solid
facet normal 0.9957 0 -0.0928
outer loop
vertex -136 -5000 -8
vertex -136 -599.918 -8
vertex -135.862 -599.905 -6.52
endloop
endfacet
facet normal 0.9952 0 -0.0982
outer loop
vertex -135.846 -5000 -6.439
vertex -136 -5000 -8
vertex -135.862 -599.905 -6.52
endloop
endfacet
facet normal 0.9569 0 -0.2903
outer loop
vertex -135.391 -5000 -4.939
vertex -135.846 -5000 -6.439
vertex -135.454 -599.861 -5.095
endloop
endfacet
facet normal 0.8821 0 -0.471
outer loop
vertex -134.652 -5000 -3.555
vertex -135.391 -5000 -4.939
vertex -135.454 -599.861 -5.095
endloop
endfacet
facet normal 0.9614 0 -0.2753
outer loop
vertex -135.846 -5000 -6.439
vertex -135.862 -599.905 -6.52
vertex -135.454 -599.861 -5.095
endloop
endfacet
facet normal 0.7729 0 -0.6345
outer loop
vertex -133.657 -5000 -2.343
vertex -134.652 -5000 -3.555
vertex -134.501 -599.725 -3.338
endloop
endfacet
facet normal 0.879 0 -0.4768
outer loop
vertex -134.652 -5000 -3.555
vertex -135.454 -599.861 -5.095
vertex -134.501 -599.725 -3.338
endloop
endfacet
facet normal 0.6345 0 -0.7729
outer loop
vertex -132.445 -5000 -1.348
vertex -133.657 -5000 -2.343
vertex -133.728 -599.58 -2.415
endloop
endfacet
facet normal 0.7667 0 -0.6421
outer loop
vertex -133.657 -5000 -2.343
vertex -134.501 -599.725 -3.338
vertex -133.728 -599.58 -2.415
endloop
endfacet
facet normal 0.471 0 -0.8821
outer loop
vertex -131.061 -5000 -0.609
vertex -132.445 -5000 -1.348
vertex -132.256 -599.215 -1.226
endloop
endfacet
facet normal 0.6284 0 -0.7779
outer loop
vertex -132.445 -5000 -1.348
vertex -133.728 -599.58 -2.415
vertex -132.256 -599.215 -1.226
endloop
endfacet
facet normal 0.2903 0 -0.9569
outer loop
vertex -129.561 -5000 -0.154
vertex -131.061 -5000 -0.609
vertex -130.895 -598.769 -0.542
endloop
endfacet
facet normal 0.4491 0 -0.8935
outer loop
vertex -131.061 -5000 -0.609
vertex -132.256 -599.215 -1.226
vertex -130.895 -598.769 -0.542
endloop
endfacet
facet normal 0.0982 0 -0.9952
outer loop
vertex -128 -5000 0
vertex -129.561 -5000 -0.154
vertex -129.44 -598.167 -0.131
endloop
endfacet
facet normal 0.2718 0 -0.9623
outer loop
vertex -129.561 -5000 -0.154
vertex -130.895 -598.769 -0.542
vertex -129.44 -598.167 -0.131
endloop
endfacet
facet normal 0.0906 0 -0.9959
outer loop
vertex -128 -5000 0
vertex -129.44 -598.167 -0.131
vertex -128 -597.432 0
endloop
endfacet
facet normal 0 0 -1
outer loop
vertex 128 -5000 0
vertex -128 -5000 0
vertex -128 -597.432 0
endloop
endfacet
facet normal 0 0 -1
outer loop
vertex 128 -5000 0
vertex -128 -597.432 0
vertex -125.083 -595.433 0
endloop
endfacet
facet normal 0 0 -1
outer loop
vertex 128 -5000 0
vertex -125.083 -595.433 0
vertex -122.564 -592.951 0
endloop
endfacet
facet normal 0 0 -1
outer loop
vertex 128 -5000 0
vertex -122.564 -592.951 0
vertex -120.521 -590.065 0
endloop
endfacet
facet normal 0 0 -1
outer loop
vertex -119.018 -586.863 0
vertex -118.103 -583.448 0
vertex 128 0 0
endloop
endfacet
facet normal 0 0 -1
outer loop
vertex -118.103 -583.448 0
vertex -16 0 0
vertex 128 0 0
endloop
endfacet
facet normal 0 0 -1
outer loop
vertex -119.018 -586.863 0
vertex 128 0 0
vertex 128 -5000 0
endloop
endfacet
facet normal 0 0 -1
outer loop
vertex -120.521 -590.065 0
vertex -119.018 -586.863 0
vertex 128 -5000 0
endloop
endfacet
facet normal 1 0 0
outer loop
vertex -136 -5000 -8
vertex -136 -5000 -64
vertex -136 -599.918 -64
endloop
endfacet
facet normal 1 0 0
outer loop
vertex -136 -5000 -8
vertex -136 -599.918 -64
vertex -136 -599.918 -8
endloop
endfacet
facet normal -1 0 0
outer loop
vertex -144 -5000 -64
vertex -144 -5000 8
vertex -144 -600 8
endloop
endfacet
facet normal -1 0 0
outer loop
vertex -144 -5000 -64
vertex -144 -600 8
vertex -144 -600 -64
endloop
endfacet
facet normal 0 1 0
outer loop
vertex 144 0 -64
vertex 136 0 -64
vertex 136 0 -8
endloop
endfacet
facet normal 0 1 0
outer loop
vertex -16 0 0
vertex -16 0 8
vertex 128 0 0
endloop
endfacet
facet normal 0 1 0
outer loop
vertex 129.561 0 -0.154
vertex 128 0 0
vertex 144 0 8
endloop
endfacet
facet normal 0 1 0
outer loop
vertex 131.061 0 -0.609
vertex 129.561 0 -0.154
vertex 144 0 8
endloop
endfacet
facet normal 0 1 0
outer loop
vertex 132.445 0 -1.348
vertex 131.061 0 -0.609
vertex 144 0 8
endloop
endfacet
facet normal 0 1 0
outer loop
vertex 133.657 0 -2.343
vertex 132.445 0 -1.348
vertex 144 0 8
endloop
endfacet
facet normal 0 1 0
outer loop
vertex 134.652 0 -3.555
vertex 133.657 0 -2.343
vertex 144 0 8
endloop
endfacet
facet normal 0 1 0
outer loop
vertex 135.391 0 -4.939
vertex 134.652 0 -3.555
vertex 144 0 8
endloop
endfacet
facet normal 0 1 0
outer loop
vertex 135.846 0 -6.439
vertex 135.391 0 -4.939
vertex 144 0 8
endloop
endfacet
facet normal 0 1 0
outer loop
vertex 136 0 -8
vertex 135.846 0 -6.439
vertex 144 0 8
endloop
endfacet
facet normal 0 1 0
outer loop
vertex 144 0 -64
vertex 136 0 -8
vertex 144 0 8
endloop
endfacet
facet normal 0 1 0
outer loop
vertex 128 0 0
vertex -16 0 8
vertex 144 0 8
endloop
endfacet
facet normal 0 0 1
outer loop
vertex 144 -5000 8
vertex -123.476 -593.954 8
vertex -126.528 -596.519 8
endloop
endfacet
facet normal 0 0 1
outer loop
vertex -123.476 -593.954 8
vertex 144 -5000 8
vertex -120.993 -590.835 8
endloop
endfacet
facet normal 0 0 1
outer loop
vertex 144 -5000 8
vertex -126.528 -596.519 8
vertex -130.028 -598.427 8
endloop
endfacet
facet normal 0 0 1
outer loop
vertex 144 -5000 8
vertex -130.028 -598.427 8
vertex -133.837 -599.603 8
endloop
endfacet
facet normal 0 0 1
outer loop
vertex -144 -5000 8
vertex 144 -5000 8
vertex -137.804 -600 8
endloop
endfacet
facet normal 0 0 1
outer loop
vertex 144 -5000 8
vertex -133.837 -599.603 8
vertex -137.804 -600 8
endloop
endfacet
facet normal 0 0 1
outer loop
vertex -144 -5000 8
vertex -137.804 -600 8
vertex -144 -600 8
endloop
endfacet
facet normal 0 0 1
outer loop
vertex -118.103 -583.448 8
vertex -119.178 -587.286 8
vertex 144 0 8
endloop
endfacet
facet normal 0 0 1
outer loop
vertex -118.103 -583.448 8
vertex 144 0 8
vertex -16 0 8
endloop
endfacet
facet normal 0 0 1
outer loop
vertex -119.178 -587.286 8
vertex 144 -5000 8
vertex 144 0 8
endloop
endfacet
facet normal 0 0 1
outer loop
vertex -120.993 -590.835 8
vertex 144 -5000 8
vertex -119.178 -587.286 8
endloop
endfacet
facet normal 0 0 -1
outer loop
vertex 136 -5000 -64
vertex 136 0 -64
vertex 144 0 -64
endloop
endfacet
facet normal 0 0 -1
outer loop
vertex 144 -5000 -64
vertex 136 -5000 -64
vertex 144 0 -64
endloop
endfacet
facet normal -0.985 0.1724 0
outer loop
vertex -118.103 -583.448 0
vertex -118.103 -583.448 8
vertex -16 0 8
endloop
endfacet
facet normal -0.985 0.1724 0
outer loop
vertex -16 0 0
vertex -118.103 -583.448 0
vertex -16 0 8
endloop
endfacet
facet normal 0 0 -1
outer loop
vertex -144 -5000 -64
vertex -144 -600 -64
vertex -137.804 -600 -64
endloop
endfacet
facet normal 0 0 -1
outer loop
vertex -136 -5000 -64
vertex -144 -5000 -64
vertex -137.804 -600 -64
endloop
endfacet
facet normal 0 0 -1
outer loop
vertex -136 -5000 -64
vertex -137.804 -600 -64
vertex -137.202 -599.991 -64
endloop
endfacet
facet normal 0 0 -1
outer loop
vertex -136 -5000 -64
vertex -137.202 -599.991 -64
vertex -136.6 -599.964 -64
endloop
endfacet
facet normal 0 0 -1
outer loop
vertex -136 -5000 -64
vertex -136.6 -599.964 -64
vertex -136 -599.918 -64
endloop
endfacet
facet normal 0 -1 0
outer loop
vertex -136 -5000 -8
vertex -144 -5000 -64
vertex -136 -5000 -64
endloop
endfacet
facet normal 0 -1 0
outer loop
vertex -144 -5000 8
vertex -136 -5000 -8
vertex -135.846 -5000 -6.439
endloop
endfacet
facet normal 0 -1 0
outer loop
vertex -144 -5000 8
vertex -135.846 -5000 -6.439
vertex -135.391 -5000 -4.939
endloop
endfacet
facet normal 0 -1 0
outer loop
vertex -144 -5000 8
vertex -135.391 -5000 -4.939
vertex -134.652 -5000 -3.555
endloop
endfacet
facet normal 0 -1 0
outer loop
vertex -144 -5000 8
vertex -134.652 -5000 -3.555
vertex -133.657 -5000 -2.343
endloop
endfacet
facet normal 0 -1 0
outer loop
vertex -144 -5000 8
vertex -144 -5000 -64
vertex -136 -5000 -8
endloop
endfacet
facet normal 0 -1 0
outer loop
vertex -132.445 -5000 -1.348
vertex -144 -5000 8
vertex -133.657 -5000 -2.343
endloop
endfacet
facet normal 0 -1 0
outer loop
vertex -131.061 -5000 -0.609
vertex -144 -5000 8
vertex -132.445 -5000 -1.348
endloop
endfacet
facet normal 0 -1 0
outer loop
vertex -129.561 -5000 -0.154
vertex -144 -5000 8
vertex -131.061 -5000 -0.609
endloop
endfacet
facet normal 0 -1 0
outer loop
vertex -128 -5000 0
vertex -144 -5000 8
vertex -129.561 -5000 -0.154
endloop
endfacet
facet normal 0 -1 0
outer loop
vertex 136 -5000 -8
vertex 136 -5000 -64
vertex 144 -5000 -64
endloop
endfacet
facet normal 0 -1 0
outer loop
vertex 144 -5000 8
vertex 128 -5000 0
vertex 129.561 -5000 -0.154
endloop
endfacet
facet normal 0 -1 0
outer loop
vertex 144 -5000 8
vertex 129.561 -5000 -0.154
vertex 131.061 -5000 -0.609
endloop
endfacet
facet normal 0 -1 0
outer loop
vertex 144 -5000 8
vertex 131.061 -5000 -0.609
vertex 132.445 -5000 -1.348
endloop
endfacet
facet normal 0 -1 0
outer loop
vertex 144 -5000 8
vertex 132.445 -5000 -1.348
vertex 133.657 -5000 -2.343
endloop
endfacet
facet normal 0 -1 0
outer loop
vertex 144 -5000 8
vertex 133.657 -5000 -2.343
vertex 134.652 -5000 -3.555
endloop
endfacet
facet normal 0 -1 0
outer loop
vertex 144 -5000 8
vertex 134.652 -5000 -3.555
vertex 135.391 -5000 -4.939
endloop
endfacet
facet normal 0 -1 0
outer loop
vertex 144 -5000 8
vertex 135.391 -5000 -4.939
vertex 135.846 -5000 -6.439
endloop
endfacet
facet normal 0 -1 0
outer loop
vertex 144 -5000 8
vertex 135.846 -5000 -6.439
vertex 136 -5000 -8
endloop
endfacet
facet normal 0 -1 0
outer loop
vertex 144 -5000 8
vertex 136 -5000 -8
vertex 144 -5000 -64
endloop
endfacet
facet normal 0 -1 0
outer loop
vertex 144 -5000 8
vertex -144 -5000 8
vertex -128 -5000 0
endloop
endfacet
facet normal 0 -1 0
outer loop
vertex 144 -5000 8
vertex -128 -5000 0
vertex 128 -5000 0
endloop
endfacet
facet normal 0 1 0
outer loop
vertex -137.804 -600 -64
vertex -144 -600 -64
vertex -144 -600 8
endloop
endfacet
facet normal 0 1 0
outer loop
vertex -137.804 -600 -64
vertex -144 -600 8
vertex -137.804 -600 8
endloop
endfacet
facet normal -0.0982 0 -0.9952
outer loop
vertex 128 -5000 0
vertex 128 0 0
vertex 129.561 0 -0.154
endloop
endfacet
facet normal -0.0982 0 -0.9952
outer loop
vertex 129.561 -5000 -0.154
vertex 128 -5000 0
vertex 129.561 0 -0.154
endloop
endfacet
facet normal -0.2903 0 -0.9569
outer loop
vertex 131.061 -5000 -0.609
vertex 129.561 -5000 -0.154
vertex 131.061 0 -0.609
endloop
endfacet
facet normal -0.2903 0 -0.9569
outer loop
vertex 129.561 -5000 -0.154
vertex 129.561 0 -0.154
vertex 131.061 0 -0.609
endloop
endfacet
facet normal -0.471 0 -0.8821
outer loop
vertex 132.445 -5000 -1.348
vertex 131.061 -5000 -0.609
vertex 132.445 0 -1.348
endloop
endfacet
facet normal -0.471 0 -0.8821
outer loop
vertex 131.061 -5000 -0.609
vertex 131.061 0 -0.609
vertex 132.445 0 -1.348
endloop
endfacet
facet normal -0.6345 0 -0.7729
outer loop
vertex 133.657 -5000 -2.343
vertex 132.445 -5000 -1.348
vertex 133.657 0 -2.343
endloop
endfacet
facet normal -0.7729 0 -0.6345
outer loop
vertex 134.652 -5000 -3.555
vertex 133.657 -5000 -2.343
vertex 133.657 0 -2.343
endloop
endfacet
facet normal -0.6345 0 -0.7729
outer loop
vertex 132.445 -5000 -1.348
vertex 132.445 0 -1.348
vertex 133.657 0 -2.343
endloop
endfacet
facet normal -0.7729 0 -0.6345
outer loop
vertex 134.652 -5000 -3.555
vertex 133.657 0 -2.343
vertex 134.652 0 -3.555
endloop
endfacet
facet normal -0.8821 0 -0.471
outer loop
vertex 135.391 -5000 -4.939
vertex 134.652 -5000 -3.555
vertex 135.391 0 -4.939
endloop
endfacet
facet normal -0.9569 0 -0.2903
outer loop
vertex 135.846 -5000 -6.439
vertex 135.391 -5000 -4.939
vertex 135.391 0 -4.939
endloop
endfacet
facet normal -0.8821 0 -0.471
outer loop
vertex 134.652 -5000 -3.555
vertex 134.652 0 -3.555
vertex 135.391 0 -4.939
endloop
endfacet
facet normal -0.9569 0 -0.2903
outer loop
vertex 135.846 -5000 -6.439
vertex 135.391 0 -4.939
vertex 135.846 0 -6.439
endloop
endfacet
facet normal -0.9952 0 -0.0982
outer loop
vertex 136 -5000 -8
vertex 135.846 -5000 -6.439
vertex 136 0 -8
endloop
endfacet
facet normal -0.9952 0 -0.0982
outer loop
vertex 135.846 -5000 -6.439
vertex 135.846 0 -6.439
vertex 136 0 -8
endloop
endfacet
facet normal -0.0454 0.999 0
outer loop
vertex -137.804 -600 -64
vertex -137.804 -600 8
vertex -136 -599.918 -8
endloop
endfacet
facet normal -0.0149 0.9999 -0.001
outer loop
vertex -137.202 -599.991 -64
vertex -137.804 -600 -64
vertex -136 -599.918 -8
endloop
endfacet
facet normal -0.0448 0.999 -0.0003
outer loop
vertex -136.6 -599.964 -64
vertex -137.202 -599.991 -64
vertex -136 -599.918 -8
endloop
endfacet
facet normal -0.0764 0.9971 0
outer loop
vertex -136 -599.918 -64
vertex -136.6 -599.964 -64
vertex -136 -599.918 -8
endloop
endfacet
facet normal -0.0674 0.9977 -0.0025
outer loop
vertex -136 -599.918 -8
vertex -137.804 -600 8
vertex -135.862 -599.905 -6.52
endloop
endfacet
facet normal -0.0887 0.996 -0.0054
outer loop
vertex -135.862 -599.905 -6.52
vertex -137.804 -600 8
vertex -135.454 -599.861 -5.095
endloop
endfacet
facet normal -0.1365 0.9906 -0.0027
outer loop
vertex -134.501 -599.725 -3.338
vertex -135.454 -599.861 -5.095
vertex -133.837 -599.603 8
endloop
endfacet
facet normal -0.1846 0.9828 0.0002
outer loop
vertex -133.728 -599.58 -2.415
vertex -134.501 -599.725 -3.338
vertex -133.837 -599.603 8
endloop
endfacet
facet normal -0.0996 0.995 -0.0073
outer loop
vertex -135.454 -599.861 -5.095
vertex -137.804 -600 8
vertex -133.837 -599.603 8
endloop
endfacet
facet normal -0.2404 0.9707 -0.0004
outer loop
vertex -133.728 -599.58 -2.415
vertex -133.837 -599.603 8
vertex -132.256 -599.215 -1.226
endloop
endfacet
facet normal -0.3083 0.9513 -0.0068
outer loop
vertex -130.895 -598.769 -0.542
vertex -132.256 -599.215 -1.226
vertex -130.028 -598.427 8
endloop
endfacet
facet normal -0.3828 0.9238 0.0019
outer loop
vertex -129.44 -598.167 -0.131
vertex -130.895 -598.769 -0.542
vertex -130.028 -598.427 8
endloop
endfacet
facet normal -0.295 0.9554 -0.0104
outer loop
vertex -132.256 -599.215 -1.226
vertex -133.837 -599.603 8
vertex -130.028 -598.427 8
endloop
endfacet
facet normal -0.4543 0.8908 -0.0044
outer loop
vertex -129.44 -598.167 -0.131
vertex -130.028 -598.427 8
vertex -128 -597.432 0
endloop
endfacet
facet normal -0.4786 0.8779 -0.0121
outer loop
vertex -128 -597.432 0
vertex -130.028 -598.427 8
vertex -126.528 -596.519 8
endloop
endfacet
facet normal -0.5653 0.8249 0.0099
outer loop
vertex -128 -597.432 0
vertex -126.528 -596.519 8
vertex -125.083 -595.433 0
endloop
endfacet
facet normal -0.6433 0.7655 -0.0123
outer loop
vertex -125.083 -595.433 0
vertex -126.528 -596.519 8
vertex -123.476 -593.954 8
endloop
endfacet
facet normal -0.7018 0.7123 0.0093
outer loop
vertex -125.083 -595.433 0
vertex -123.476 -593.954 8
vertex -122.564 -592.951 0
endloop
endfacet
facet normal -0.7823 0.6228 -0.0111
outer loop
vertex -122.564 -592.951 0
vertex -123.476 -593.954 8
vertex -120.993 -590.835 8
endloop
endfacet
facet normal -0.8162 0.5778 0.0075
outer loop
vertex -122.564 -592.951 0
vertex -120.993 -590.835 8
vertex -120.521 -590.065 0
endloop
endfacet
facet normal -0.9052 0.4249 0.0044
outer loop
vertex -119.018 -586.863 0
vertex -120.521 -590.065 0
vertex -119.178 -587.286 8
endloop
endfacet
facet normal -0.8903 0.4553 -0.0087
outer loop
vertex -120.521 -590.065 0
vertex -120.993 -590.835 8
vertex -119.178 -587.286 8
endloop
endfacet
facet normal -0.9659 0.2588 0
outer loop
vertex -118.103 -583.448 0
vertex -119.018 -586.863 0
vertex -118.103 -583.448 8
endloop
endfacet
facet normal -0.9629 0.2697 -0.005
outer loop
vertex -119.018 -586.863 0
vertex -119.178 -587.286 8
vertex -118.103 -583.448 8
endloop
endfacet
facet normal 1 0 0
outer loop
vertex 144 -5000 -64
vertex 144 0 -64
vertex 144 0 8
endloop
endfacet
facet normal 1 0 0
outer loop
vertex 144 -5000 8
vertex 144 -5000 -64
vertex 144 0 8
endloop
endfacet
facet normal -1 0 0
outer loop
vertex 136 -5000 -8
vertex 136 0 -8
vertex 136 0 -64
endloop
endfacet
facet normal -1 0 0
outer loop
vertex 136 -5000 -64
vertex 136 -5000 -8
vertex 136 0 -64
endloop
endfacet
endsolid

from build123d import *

# Parameters (mm, degrees)
F1_DEPTH = 5000
F3_DEPTH = 72.001


with BuildPart() as f1:
    # F0 (on Front) → F1 (new body)
    with BuildSketch(Plane.XZ):
        with BuildLine():
            Line((144, 8), (0, 8))
            Line((0, 8), (-144, 8))
            Line((-144, 8), (-144, -64))
            Line((-144, -64), (-136, -64))
            Line((-136, -64), (-136, -8))
            ThreePointArc((-136, -8), (-133.656854, -2.343146), (-128, 0))
            Line((-128, 0), (0, 0))
            Line((0, 0), (128, 0))
            ThreePointArc((128, 0), (133.656854, -2.343146), (136, -8))
            Line((136, -8), (136, -64))
            Line((136, -64), (144, -64))
            Line((144, -64), (144, 8))
        make_face()
    extrude(amount=F1_DEPTH)

    # F2 (on face) → F3 (cut, through all)
    with BuildSketch(Plane.XY.offset(8)):
        with BuildLine():
            Line((-118.103331, -583.447607), (-16, 0))
            Line((-16, 0), (-144, 0))
            Line((-144, 0), (-144, -600))
            Line((-144, -600), (-137.803941, -600))
            ThreePointArc((-137.803941, -600), (-124.93833, -595.312611), (-118.103331, -583.447607))
        make_face()
    extrude(amount=-F3_DEPTH, mode=Mode.SUBTRACT)


solid = f1.part
